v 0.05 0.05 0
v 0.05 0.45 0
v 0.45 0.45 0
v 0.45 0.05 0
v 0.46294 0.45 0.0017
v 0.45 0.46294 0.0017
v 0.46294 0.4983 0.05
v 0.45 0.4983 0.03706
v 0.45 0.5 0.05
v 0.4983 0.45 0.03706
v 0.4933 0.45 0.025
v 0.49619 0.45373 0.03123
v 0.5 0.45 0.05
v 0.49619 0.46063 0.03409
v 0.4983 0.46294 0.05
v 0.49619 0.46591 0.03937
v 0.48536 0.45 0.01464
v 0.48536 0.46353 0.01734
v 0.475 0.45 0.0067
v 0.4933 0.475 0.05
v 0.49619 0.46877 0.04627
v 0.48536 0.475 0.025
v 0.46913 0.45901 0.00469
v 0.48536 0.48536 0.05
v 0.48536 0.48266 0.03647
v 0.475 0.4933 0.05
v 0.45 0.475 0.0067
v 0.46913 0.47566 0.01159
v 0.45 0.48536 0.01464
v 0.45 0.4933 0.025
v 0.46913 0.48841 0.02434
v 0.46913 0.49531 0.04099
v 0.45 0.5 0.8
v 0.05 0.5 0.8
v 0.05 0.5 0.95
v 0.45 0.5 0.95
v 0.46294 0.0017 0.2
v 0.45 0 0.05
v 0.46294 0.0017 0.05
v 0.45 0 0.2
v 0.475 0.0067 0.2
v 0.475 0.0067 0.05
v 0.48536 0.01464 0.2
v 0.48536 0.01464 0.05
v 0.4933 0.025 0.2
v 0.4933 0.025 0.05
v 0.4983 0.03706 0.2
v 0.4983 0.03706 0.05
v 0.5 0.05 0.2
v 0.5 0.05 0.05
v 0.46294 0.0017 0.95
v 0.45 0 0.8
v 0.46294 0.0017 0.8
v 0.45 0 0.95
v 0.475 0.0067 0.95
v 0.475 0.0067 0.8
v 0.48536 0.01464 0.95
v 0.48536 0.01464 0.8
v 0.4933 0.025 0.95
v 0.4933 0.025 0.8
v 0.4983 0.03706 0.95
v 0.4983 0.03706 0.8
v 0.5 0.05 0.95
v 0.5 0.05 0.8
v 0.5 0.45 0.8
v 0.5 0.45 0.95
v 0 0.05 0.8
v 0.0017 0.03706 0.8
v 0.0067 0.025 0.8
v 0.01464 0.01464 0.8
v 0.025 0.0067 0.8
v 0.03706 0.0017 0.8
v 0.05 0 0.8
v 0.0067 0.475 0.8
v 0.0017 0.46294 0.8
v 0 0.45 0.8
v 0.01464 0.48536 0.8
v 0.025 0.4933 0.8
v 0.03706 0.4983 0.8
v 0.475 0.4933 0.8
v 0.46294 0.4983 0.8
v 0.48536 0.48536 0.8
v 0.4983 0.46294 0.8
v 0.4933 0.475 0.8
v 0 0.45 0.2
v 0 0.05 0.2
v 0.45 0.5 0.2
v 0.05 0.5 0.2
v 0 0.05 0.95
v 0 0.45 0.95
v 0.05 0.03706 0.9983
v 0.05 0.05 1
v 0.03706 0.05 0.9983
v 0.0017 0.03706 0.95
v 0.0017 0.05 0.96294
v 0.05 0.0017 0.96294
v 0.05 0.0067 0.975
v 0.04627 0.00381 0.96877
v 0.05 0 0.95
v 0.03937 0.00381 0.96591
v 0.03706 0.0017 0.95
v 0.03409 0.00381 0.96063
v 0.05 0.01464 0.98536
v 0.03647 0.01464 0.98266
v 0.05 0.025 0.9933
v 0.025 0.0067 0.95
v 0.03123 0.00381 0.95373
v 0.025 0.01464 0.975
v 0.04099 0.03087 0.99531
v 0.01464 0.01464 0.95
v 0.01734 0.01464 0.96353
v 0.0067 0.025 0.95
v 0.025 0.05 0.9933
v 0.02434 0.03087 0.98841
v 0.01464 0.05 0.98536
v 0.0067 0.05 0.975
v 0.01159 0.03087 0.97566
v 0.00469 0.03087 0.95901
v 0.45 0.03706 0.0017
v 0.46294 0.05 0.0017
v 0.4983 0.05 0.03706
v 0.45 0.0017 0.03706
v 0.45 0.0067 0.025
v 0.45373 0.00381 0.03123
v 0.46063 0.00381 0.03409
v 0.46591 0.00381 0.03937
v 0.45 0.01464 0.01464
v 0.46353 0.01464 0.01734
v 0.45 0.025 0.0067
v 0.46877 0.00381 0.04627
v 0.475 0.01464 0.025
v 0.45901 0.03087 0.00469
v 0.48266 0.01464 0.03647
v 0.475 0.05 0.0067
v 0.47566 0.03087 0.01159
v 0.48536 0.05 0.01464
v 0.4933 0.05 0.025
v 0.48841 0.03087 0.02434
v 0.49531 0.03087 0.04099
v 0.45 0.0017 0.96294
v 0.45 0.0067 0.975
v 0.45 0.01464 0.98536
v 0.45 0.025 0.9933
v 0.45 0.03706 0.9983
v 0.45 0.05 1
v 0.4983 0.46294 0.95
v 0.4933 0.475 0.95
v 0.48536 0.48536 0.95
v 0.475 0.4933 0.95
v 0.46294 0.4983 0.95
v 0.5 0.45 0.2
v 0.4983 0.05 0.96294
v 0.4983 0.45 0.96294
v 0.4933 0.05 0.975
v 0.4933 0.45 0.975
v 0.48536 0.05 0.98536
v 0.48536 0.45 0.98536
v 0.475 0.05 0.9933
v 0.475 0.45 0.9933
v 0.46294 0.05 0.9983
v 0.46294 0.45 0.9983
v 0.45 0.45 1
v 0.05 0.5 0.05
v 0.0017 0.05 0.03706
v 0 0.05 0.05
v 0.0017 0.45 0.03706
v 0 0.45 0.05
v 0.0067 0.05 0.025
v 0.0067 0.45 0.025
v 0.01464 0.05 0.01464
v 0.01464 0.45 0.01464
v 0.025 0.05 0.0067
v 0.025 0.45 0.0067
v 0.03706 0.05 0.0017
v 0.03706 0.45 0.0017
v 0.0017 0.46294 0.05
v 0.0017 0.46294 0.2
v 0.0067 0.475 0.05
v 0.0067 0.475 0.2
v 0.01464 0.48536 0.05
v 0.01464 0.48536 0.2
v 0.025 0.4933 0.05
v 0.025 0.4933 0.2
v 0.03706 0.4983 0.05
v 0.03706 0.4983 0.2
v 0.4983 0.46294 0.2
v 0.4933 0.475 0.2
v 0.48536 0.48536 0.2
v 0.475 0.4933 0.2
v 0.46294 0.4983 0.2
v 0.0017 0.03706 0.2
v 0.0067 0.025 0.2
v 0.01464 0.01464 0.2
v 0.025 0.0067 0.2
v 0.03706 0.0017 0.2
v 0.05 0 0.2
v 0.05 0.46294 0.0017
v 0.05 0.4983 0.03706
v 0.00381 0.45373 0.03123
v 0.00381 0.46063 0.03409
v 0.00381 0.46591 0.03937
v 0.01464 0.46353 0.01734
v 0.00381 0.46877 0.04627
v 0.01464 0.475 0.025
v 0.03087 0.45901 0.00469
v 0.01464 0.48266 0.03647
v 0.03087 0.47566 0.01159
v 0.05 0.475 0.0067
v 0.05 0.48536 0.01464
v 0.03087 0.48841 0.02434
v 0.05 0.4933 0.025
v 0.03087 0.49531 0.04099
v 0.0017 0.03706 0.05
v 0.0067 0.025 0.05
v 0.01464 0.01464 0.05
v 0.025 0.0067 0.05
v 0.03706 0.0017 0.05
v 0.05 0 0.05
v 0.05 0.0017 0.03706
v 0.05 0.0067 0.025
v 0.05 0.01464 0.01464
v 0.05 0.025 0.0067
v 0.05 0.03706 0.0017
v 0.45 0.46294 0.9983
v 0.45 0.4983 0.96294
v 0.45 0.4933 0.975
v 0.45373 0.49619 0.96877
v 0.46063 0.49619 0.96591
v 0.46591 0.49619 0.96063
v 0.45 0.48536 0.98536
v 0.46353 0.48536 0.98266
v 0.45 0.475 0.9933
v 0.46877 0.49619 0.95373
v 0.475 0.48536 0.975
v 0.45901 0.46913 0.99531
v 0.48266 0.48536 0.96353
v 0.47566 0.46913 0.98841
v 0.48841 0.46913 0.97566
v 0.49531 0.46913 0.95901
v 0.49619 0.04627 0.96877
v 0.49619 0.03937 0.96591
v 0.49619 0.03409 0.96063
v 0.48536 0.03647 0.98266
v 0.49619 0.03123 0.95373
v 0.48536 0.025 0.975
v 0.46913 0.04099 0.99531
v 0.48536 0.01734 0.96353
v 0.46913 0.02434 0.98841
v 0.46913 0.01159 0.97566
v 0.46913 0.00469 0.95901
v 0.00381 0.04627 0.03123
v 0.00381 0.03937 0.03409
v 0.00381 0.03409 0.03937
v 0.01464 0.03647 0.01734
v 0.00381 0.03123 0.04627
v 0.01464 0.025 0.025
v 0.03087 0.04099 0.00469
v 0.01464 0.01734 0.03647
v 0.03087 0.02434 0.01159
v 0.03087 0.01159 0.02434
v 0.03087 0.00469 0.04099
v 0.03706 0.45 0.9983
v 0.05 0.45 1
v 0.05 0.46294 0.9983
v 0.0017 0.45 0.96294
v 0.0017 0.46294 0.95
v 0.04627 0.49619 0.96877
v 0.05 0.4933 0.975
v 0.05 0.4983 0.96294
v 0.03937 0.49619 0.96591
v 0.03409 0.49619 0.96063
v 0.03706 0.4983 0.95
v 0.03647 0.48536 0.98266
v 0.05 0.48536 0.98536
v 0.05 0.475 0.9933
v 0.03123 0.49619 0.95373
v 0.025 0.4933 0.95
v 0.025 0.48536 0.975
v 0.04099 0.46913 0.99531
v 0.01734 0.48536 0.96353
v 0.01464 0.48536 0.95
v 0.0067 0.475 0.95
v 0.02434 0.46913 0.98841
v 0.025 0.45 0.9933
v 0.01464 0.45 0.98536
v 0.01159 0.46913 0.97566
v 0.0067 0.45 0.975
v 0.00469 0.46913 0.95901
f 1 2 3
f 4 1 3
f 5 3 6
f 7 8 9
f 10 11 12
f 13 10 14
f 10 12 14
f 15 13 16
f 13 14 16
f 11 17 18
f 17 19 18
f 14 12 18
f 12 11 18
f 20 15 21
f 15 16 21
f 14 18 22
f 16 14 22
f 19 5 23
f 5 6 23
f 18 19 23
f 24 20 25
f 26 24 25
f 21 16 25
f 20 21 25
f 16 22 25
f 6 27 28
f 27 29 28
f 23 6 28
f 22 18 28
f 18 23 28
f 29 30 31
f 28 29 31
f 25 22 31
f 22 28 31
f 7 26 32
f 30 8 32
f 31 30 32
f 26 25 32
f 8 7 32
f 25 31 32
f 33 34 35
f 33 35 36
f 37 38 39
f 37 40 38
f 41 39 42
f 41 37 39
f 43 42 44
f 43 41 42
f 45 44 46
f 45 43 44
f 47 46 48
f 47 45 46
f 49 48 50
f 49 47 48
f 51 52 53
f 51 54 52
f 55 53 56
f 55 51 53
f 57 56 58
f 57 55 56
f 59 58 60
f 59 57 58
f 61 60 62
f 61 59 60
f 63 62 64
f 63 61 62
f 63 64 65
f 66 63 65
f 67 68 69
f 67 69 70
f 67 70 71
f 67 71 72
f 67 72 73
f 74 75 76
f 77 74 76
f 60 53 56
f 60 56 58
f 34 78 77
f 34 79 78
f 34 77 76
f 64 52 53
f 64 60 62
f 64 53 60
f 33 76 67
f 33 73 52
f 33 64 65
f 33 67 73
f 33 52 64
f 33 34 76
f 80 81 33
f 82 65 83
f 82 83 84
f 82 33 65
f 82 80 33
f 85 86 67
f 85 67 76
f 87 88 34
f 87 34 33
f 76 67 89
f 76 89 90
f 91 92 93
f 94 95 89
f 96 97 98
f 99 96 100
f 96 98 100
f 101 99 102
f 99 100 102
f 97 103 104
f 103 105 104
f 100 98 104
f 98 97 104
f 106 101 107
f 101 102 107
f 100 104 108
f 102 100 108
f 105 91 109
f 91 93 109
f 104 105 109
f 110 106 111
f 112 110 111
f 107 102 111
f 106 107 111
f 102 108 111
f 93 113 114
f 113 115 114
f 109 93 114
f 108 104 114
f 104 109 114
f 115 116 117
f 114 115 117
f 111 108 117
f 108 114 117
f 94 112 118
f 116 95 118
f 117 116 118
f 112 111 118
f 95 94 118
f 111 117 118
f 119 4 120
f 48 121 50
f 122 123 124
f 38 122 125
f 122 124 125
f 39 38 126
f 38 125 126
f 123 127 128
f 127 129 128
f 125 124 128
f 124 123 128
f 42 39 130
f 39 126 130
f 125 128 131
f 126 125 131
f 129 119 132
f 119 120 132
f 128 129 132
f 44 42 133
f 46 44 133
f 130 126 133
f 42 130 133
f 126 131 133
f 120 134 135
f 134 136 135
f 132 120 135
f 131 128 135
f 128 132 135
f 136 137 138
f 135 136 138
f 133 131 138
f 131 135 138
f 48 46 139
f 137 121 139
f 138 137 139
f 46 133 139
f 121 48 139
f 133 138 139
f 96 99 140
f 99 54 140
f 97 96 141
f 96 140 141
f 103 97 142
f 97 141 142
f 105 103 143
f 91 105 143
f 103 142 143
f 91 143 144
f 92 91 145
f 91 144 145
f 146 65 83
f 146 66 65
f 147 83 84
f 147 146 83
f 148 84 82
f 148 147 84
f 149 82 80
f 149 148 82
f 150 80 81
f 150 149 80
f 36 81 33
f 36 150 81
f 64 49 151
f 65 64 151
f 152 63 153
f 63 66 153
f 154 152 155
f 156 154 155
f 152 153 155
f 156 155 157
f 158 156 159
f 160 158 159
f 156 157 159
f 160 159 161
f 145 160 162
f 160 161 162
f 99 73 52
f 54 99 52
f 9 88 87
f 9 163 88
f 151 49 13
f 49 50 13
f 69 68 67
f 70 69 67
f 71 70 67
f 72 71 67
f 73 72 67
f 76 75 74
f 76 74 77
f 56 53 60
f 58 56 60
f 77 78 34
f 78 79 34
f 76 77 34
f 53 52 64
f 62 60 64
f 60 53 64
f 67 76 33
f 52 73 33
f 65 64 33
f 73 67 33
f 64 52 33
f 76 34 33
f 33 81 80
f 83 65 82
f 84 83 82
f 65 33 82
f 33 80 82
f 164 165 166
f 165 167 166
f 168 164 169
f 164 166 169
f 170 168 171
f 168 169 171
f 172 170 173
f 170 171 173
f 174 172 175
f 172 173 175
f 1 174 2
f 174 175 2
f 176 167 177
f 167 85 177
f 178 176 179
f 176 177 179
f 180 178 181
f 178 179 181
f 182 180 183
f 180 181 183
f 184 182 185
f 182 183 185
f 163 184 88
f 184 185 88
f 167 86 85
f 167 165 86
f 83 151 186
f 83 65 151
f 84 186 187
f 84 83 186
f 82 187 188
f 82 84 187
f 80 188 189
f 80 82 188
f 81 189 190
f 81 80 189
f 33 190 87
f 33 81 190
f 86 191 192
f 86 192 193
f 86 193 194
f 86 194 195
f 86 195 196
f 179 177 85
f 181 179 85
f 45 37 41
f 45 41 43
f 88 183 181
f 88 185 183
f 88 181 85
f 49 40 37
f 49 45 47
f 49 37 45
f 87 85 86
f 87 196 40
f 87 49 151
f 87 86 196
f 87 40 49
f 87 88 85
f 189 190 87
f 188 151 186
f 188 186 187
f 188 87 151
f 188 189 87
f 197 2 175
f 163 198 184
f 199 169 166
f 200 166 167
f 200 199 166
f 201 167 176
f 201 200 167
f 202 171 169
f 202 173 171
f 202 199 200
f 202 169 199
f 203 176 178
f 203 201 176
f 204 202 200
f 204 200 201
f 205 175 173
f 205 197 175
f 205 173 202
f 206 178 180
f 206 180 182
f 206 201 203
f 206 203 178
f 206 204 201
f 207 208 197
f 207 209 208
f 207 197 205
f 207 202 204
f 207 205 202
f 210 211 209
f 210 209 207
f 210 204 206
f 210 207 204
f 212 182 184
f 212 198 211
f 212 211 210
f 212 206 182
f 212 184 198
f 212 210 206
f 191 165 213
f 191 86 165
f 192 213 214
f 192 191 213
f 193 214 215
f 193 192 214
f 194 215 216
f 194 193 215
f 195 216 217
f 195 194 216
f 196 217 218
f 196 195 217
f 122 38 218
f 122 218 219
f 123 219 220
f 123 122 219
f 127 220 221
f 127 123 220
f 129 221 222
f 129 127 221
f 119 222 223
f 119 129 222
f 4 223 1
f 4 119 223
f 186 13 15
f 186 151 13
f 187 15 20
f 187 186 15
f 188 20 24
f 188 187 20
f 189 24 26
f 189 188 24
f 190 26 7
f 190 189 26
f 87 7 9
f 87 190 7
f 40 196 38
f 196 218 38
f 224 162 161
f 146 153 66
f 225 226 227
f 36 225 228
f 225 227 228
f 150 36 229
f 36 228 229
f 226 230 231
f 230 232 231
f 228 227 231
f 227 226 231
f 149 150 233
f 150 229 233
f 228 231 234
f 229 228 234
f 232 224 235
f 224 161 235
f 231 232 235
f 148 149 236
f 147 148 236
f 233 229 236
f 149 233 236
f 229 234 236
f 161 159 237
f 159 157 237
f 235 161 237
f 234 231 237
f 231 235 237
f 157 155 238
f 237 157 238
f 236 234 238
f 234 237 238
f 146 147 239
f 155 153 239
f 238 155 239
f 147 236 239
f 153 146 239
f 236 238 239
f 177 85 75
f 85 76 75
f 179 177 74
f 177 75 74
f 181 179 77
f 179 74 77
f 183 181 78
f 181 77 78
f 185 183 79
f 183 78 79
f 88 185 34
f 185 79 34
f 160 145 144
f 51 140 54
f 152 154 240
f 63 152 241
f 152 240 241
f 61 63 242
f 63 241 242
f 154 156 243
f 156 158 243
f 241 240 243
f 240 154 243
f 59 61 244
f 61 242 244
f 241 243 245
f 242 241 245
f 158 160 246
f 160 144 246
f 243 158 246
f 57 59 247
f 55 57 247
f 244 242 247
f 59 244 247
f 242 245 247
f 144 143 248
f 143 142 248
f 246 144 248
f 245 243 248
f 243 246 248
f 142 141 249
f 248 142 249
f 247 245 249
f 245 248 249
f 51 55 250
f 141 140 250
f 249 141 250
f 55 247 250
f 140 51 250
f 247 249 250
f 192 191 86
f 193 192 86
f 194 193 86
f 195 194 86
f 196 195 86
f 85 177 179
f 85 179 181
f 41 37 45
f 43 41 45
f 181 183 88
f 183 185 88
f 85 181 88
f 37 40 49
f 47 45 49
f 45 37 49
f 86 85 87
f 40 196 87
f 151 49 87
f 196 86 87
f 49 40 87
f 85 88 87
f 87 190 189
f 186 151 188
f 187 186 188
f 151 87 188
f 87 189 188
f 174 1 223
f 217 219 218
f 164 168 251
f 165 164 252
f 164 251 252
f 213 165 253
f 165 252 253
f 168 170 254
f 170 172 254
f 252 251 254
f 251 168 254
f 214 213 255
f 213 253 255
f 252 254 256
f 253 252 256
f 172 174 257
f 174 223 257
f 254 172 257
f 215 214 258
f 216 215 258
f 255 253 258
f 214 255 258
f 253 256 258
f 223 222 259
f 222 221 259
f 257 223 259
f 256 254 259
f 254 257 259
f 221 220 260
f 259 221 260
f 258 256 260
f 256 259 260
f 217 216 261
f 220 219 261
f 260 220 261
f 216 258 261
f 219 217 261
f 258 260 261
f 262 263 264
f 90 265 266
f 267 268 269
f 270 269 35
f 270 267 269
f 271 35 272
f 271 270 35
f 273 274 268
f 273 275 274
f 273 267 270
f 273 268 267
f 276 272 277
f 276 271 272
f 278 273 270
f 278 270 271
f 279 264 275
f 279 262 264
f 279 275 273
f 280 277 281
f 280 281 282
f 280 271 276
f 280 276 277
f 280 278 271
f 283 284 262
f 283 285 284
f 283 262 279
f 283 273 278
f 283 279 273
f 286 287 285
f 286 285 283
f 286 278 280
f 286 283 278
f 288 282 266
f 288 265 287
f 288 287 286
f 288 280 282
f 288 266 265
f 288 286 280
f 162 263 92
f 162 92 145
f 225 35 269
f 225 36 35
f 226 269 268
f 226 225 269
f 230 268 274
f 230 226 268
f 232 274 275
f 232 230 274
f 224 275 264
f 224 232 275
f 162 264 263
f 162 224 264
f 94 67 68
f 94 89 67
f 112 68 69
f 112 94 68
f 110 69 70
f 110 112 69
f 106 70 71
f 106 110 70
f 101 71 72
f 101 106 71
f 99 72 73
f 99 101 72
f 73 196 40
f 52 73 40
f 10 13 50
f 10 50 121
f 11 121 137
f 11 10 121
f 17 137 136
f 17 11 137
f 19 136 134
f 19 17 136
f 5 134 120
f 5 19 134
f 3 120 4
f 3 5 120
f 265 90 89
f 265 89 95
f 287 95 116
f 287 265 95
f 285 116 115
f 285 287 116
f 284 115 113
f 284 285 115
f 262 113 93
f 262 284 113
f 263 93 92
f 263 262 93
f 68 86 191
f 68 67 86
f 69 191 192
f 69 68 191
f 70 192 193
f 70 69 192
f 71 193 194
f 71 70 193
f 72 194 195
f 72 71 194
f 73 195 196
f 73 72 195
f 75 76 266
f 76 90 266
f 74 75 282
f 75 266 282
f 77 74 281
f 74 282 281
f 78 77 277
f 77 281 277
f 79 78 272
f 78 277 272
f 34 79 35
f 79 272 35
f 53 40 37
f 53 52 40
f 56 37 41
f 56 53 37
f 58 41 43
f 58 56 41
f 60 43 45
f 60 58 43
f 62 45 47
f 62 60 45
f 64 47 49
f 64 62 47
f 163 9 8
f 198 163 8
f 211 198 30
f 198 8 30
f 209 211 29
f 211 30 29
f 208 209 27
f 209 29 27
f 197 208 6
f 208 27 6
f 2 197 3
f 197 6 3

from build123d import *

# Parameters (mm, degrees)
SKETCH2_W           = 0.5
SKETCH2_H           = 0.5
BOSS_EXTRUDE1_DEPTH = 0.2
SKETCH3_W           = 0.5
SKETCH3_H           = 0.5
BOSS_EXTRUDE2_DEPTH = 0.6
SKETCH5_W           = 0.5
SKETCH5_H           = 0.5
BOSS_EXTRUDE4_DEPTH = 0.2
FILLET2_R           = 0.05
FILLET3_R           = 0.05
FILLET4_R           = 0.05


with BuildPart() as part:
    # Sketch2 → Boss-Extrude1 (new body)
    with BuildSketch(Plane.XY):
        with Locations((0.25, 0.25)):
            Rectangle(SKETCH2_W, SKETCH2_H)
    extrude(amount=BOSS_EXTRUDE1_DEPTH)

    # Fillet4
    fillet4_edges = [part.edges().sort_by_distance(p)[0] for p in [
        (0.25, 0.5, 0),
        (0.5, 0.25, 0),
        (0.25, 0, 0),
        (0, 0.25, 0),
        (0, 0.5, 0.1),
        (0.5, 0.5, 0.1),
        (0.5, 0, 0.1),
        (0, 0, 0.1),
    ]]
    fillet(fillet4_edges, radius=FILLET4_R)


with BuildPart() as body_2:
    # Sketch3 → Boss-Extrude2 (new body)
    with BuildSketch(Plane.XY.offset(0.2)):
        with Locations((0.25, 0.25)):
            Rectangle(SKETCH3_W, SKETCH3_H)
    extrude(amount=BOSS_EXTRUDE2_DEPTH)

    # Fillet3
    fillet3_edges = [body_2.edges().sort_by_distance(p)[0] for p in [
        (0.5, 0.5, 0.5),
        (0.5, 0, 0.5),
        (0, 0, 0.5),
        (0, 0.5, 0.5),
    ]]
    fillet(fillet3_edges, radius=FILLET3_R)


with BuildPart() as body_3:
    # Sketch5 → Boss-Extrude4 (new body)
    with BuildSketch(Plane.XY.offset(0.8)):
        with Locations((0.25, 0.25)):
            Rectangle(SKETCH5_W, SKETCH5_H)
    extrude(amount=BOSS_EXTRUDE4_DEPTH)

    # Fillet2
    fillet2_edges = [body_3.edges().sort_by_distance(p)[0] for p in [
        (0, 0.25, 1),
        (0.25, 0, 1),
        (0.5, 0.25, 1),
        (0.25, 0.5, 1),
        (0.5, 0, 0.9),
        (0, 0, 0.9),
        (0, 0.5, 0.9),
        (0.5, 0.5, 0.9),
    ]]
    fillet(fillet2_edges, radius=FILLET2_R)


solid = Compound([part.part, body_2.part, body_3.part])
